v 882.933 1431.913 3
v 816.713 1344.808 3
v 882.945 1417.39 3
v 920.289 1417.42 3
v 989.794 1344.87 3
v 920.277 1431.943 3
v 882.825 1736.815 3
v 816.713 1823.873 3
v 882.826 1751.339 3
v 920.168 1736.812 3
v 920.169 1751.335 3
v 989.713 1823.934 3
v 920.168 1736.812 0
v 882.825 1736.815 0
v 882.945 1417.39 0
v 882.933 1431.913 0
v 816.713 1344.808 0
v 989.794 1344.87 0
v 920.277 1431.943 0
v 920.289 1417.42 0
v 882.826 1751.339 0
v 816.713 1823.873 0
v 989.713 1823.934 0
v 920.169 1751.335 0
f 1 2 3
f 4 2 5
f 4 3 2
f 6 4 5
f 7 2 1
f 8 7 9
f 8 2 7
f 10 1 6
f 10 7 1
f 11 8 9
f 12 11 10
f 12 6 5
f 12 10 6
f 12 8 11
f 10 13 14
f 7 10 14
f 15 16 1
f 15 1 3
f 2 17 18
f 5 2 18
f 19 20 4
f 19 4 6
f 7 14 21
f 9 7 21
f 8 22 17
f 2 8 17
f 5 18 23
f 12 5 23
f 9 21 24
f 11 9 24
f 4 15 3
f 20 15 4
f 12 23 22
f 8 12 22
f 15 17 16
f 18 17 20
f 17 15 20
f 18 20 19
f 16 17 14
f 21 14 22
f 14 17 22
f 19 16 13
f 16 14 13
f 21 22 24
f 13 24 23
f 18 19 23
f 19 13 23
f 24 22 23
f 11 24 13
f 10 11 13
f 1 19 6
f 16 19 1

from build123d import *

# Parameters (mm, degrees)
BOSS_EXTRUDE1_DEPTH = 3


with BuildPart() as part:
    # Sketch1 → Boss-Extrude1 (new body)
    with BuildSketch(Plane.XY):
        Polygon((989.794405427, 1344.870125695), (989.713281448, 1823.934382844), (816.713281448, 1823.87268837), (816.713281448, 1344.808424352), align=None)
        Polygon((920.276734998, 1431.94331108), (882.933248531, 1431.912947905), (882.945057035, 1417.389739929), (920.288543502, 1417.420103104), align=None, mode=Mode.SUBTRACT)
        Polygon((882.824535058, 1736.81534774), (882.825987011, 1751.338560444), (920.169485635, 1751.334827041), (920.168033682, 1736.811614337), align=None, mode=Mode.SUBTRACT)
    extrude(amount=BOSS_EXTRUDE1_DEPTH)


solid = part.part
